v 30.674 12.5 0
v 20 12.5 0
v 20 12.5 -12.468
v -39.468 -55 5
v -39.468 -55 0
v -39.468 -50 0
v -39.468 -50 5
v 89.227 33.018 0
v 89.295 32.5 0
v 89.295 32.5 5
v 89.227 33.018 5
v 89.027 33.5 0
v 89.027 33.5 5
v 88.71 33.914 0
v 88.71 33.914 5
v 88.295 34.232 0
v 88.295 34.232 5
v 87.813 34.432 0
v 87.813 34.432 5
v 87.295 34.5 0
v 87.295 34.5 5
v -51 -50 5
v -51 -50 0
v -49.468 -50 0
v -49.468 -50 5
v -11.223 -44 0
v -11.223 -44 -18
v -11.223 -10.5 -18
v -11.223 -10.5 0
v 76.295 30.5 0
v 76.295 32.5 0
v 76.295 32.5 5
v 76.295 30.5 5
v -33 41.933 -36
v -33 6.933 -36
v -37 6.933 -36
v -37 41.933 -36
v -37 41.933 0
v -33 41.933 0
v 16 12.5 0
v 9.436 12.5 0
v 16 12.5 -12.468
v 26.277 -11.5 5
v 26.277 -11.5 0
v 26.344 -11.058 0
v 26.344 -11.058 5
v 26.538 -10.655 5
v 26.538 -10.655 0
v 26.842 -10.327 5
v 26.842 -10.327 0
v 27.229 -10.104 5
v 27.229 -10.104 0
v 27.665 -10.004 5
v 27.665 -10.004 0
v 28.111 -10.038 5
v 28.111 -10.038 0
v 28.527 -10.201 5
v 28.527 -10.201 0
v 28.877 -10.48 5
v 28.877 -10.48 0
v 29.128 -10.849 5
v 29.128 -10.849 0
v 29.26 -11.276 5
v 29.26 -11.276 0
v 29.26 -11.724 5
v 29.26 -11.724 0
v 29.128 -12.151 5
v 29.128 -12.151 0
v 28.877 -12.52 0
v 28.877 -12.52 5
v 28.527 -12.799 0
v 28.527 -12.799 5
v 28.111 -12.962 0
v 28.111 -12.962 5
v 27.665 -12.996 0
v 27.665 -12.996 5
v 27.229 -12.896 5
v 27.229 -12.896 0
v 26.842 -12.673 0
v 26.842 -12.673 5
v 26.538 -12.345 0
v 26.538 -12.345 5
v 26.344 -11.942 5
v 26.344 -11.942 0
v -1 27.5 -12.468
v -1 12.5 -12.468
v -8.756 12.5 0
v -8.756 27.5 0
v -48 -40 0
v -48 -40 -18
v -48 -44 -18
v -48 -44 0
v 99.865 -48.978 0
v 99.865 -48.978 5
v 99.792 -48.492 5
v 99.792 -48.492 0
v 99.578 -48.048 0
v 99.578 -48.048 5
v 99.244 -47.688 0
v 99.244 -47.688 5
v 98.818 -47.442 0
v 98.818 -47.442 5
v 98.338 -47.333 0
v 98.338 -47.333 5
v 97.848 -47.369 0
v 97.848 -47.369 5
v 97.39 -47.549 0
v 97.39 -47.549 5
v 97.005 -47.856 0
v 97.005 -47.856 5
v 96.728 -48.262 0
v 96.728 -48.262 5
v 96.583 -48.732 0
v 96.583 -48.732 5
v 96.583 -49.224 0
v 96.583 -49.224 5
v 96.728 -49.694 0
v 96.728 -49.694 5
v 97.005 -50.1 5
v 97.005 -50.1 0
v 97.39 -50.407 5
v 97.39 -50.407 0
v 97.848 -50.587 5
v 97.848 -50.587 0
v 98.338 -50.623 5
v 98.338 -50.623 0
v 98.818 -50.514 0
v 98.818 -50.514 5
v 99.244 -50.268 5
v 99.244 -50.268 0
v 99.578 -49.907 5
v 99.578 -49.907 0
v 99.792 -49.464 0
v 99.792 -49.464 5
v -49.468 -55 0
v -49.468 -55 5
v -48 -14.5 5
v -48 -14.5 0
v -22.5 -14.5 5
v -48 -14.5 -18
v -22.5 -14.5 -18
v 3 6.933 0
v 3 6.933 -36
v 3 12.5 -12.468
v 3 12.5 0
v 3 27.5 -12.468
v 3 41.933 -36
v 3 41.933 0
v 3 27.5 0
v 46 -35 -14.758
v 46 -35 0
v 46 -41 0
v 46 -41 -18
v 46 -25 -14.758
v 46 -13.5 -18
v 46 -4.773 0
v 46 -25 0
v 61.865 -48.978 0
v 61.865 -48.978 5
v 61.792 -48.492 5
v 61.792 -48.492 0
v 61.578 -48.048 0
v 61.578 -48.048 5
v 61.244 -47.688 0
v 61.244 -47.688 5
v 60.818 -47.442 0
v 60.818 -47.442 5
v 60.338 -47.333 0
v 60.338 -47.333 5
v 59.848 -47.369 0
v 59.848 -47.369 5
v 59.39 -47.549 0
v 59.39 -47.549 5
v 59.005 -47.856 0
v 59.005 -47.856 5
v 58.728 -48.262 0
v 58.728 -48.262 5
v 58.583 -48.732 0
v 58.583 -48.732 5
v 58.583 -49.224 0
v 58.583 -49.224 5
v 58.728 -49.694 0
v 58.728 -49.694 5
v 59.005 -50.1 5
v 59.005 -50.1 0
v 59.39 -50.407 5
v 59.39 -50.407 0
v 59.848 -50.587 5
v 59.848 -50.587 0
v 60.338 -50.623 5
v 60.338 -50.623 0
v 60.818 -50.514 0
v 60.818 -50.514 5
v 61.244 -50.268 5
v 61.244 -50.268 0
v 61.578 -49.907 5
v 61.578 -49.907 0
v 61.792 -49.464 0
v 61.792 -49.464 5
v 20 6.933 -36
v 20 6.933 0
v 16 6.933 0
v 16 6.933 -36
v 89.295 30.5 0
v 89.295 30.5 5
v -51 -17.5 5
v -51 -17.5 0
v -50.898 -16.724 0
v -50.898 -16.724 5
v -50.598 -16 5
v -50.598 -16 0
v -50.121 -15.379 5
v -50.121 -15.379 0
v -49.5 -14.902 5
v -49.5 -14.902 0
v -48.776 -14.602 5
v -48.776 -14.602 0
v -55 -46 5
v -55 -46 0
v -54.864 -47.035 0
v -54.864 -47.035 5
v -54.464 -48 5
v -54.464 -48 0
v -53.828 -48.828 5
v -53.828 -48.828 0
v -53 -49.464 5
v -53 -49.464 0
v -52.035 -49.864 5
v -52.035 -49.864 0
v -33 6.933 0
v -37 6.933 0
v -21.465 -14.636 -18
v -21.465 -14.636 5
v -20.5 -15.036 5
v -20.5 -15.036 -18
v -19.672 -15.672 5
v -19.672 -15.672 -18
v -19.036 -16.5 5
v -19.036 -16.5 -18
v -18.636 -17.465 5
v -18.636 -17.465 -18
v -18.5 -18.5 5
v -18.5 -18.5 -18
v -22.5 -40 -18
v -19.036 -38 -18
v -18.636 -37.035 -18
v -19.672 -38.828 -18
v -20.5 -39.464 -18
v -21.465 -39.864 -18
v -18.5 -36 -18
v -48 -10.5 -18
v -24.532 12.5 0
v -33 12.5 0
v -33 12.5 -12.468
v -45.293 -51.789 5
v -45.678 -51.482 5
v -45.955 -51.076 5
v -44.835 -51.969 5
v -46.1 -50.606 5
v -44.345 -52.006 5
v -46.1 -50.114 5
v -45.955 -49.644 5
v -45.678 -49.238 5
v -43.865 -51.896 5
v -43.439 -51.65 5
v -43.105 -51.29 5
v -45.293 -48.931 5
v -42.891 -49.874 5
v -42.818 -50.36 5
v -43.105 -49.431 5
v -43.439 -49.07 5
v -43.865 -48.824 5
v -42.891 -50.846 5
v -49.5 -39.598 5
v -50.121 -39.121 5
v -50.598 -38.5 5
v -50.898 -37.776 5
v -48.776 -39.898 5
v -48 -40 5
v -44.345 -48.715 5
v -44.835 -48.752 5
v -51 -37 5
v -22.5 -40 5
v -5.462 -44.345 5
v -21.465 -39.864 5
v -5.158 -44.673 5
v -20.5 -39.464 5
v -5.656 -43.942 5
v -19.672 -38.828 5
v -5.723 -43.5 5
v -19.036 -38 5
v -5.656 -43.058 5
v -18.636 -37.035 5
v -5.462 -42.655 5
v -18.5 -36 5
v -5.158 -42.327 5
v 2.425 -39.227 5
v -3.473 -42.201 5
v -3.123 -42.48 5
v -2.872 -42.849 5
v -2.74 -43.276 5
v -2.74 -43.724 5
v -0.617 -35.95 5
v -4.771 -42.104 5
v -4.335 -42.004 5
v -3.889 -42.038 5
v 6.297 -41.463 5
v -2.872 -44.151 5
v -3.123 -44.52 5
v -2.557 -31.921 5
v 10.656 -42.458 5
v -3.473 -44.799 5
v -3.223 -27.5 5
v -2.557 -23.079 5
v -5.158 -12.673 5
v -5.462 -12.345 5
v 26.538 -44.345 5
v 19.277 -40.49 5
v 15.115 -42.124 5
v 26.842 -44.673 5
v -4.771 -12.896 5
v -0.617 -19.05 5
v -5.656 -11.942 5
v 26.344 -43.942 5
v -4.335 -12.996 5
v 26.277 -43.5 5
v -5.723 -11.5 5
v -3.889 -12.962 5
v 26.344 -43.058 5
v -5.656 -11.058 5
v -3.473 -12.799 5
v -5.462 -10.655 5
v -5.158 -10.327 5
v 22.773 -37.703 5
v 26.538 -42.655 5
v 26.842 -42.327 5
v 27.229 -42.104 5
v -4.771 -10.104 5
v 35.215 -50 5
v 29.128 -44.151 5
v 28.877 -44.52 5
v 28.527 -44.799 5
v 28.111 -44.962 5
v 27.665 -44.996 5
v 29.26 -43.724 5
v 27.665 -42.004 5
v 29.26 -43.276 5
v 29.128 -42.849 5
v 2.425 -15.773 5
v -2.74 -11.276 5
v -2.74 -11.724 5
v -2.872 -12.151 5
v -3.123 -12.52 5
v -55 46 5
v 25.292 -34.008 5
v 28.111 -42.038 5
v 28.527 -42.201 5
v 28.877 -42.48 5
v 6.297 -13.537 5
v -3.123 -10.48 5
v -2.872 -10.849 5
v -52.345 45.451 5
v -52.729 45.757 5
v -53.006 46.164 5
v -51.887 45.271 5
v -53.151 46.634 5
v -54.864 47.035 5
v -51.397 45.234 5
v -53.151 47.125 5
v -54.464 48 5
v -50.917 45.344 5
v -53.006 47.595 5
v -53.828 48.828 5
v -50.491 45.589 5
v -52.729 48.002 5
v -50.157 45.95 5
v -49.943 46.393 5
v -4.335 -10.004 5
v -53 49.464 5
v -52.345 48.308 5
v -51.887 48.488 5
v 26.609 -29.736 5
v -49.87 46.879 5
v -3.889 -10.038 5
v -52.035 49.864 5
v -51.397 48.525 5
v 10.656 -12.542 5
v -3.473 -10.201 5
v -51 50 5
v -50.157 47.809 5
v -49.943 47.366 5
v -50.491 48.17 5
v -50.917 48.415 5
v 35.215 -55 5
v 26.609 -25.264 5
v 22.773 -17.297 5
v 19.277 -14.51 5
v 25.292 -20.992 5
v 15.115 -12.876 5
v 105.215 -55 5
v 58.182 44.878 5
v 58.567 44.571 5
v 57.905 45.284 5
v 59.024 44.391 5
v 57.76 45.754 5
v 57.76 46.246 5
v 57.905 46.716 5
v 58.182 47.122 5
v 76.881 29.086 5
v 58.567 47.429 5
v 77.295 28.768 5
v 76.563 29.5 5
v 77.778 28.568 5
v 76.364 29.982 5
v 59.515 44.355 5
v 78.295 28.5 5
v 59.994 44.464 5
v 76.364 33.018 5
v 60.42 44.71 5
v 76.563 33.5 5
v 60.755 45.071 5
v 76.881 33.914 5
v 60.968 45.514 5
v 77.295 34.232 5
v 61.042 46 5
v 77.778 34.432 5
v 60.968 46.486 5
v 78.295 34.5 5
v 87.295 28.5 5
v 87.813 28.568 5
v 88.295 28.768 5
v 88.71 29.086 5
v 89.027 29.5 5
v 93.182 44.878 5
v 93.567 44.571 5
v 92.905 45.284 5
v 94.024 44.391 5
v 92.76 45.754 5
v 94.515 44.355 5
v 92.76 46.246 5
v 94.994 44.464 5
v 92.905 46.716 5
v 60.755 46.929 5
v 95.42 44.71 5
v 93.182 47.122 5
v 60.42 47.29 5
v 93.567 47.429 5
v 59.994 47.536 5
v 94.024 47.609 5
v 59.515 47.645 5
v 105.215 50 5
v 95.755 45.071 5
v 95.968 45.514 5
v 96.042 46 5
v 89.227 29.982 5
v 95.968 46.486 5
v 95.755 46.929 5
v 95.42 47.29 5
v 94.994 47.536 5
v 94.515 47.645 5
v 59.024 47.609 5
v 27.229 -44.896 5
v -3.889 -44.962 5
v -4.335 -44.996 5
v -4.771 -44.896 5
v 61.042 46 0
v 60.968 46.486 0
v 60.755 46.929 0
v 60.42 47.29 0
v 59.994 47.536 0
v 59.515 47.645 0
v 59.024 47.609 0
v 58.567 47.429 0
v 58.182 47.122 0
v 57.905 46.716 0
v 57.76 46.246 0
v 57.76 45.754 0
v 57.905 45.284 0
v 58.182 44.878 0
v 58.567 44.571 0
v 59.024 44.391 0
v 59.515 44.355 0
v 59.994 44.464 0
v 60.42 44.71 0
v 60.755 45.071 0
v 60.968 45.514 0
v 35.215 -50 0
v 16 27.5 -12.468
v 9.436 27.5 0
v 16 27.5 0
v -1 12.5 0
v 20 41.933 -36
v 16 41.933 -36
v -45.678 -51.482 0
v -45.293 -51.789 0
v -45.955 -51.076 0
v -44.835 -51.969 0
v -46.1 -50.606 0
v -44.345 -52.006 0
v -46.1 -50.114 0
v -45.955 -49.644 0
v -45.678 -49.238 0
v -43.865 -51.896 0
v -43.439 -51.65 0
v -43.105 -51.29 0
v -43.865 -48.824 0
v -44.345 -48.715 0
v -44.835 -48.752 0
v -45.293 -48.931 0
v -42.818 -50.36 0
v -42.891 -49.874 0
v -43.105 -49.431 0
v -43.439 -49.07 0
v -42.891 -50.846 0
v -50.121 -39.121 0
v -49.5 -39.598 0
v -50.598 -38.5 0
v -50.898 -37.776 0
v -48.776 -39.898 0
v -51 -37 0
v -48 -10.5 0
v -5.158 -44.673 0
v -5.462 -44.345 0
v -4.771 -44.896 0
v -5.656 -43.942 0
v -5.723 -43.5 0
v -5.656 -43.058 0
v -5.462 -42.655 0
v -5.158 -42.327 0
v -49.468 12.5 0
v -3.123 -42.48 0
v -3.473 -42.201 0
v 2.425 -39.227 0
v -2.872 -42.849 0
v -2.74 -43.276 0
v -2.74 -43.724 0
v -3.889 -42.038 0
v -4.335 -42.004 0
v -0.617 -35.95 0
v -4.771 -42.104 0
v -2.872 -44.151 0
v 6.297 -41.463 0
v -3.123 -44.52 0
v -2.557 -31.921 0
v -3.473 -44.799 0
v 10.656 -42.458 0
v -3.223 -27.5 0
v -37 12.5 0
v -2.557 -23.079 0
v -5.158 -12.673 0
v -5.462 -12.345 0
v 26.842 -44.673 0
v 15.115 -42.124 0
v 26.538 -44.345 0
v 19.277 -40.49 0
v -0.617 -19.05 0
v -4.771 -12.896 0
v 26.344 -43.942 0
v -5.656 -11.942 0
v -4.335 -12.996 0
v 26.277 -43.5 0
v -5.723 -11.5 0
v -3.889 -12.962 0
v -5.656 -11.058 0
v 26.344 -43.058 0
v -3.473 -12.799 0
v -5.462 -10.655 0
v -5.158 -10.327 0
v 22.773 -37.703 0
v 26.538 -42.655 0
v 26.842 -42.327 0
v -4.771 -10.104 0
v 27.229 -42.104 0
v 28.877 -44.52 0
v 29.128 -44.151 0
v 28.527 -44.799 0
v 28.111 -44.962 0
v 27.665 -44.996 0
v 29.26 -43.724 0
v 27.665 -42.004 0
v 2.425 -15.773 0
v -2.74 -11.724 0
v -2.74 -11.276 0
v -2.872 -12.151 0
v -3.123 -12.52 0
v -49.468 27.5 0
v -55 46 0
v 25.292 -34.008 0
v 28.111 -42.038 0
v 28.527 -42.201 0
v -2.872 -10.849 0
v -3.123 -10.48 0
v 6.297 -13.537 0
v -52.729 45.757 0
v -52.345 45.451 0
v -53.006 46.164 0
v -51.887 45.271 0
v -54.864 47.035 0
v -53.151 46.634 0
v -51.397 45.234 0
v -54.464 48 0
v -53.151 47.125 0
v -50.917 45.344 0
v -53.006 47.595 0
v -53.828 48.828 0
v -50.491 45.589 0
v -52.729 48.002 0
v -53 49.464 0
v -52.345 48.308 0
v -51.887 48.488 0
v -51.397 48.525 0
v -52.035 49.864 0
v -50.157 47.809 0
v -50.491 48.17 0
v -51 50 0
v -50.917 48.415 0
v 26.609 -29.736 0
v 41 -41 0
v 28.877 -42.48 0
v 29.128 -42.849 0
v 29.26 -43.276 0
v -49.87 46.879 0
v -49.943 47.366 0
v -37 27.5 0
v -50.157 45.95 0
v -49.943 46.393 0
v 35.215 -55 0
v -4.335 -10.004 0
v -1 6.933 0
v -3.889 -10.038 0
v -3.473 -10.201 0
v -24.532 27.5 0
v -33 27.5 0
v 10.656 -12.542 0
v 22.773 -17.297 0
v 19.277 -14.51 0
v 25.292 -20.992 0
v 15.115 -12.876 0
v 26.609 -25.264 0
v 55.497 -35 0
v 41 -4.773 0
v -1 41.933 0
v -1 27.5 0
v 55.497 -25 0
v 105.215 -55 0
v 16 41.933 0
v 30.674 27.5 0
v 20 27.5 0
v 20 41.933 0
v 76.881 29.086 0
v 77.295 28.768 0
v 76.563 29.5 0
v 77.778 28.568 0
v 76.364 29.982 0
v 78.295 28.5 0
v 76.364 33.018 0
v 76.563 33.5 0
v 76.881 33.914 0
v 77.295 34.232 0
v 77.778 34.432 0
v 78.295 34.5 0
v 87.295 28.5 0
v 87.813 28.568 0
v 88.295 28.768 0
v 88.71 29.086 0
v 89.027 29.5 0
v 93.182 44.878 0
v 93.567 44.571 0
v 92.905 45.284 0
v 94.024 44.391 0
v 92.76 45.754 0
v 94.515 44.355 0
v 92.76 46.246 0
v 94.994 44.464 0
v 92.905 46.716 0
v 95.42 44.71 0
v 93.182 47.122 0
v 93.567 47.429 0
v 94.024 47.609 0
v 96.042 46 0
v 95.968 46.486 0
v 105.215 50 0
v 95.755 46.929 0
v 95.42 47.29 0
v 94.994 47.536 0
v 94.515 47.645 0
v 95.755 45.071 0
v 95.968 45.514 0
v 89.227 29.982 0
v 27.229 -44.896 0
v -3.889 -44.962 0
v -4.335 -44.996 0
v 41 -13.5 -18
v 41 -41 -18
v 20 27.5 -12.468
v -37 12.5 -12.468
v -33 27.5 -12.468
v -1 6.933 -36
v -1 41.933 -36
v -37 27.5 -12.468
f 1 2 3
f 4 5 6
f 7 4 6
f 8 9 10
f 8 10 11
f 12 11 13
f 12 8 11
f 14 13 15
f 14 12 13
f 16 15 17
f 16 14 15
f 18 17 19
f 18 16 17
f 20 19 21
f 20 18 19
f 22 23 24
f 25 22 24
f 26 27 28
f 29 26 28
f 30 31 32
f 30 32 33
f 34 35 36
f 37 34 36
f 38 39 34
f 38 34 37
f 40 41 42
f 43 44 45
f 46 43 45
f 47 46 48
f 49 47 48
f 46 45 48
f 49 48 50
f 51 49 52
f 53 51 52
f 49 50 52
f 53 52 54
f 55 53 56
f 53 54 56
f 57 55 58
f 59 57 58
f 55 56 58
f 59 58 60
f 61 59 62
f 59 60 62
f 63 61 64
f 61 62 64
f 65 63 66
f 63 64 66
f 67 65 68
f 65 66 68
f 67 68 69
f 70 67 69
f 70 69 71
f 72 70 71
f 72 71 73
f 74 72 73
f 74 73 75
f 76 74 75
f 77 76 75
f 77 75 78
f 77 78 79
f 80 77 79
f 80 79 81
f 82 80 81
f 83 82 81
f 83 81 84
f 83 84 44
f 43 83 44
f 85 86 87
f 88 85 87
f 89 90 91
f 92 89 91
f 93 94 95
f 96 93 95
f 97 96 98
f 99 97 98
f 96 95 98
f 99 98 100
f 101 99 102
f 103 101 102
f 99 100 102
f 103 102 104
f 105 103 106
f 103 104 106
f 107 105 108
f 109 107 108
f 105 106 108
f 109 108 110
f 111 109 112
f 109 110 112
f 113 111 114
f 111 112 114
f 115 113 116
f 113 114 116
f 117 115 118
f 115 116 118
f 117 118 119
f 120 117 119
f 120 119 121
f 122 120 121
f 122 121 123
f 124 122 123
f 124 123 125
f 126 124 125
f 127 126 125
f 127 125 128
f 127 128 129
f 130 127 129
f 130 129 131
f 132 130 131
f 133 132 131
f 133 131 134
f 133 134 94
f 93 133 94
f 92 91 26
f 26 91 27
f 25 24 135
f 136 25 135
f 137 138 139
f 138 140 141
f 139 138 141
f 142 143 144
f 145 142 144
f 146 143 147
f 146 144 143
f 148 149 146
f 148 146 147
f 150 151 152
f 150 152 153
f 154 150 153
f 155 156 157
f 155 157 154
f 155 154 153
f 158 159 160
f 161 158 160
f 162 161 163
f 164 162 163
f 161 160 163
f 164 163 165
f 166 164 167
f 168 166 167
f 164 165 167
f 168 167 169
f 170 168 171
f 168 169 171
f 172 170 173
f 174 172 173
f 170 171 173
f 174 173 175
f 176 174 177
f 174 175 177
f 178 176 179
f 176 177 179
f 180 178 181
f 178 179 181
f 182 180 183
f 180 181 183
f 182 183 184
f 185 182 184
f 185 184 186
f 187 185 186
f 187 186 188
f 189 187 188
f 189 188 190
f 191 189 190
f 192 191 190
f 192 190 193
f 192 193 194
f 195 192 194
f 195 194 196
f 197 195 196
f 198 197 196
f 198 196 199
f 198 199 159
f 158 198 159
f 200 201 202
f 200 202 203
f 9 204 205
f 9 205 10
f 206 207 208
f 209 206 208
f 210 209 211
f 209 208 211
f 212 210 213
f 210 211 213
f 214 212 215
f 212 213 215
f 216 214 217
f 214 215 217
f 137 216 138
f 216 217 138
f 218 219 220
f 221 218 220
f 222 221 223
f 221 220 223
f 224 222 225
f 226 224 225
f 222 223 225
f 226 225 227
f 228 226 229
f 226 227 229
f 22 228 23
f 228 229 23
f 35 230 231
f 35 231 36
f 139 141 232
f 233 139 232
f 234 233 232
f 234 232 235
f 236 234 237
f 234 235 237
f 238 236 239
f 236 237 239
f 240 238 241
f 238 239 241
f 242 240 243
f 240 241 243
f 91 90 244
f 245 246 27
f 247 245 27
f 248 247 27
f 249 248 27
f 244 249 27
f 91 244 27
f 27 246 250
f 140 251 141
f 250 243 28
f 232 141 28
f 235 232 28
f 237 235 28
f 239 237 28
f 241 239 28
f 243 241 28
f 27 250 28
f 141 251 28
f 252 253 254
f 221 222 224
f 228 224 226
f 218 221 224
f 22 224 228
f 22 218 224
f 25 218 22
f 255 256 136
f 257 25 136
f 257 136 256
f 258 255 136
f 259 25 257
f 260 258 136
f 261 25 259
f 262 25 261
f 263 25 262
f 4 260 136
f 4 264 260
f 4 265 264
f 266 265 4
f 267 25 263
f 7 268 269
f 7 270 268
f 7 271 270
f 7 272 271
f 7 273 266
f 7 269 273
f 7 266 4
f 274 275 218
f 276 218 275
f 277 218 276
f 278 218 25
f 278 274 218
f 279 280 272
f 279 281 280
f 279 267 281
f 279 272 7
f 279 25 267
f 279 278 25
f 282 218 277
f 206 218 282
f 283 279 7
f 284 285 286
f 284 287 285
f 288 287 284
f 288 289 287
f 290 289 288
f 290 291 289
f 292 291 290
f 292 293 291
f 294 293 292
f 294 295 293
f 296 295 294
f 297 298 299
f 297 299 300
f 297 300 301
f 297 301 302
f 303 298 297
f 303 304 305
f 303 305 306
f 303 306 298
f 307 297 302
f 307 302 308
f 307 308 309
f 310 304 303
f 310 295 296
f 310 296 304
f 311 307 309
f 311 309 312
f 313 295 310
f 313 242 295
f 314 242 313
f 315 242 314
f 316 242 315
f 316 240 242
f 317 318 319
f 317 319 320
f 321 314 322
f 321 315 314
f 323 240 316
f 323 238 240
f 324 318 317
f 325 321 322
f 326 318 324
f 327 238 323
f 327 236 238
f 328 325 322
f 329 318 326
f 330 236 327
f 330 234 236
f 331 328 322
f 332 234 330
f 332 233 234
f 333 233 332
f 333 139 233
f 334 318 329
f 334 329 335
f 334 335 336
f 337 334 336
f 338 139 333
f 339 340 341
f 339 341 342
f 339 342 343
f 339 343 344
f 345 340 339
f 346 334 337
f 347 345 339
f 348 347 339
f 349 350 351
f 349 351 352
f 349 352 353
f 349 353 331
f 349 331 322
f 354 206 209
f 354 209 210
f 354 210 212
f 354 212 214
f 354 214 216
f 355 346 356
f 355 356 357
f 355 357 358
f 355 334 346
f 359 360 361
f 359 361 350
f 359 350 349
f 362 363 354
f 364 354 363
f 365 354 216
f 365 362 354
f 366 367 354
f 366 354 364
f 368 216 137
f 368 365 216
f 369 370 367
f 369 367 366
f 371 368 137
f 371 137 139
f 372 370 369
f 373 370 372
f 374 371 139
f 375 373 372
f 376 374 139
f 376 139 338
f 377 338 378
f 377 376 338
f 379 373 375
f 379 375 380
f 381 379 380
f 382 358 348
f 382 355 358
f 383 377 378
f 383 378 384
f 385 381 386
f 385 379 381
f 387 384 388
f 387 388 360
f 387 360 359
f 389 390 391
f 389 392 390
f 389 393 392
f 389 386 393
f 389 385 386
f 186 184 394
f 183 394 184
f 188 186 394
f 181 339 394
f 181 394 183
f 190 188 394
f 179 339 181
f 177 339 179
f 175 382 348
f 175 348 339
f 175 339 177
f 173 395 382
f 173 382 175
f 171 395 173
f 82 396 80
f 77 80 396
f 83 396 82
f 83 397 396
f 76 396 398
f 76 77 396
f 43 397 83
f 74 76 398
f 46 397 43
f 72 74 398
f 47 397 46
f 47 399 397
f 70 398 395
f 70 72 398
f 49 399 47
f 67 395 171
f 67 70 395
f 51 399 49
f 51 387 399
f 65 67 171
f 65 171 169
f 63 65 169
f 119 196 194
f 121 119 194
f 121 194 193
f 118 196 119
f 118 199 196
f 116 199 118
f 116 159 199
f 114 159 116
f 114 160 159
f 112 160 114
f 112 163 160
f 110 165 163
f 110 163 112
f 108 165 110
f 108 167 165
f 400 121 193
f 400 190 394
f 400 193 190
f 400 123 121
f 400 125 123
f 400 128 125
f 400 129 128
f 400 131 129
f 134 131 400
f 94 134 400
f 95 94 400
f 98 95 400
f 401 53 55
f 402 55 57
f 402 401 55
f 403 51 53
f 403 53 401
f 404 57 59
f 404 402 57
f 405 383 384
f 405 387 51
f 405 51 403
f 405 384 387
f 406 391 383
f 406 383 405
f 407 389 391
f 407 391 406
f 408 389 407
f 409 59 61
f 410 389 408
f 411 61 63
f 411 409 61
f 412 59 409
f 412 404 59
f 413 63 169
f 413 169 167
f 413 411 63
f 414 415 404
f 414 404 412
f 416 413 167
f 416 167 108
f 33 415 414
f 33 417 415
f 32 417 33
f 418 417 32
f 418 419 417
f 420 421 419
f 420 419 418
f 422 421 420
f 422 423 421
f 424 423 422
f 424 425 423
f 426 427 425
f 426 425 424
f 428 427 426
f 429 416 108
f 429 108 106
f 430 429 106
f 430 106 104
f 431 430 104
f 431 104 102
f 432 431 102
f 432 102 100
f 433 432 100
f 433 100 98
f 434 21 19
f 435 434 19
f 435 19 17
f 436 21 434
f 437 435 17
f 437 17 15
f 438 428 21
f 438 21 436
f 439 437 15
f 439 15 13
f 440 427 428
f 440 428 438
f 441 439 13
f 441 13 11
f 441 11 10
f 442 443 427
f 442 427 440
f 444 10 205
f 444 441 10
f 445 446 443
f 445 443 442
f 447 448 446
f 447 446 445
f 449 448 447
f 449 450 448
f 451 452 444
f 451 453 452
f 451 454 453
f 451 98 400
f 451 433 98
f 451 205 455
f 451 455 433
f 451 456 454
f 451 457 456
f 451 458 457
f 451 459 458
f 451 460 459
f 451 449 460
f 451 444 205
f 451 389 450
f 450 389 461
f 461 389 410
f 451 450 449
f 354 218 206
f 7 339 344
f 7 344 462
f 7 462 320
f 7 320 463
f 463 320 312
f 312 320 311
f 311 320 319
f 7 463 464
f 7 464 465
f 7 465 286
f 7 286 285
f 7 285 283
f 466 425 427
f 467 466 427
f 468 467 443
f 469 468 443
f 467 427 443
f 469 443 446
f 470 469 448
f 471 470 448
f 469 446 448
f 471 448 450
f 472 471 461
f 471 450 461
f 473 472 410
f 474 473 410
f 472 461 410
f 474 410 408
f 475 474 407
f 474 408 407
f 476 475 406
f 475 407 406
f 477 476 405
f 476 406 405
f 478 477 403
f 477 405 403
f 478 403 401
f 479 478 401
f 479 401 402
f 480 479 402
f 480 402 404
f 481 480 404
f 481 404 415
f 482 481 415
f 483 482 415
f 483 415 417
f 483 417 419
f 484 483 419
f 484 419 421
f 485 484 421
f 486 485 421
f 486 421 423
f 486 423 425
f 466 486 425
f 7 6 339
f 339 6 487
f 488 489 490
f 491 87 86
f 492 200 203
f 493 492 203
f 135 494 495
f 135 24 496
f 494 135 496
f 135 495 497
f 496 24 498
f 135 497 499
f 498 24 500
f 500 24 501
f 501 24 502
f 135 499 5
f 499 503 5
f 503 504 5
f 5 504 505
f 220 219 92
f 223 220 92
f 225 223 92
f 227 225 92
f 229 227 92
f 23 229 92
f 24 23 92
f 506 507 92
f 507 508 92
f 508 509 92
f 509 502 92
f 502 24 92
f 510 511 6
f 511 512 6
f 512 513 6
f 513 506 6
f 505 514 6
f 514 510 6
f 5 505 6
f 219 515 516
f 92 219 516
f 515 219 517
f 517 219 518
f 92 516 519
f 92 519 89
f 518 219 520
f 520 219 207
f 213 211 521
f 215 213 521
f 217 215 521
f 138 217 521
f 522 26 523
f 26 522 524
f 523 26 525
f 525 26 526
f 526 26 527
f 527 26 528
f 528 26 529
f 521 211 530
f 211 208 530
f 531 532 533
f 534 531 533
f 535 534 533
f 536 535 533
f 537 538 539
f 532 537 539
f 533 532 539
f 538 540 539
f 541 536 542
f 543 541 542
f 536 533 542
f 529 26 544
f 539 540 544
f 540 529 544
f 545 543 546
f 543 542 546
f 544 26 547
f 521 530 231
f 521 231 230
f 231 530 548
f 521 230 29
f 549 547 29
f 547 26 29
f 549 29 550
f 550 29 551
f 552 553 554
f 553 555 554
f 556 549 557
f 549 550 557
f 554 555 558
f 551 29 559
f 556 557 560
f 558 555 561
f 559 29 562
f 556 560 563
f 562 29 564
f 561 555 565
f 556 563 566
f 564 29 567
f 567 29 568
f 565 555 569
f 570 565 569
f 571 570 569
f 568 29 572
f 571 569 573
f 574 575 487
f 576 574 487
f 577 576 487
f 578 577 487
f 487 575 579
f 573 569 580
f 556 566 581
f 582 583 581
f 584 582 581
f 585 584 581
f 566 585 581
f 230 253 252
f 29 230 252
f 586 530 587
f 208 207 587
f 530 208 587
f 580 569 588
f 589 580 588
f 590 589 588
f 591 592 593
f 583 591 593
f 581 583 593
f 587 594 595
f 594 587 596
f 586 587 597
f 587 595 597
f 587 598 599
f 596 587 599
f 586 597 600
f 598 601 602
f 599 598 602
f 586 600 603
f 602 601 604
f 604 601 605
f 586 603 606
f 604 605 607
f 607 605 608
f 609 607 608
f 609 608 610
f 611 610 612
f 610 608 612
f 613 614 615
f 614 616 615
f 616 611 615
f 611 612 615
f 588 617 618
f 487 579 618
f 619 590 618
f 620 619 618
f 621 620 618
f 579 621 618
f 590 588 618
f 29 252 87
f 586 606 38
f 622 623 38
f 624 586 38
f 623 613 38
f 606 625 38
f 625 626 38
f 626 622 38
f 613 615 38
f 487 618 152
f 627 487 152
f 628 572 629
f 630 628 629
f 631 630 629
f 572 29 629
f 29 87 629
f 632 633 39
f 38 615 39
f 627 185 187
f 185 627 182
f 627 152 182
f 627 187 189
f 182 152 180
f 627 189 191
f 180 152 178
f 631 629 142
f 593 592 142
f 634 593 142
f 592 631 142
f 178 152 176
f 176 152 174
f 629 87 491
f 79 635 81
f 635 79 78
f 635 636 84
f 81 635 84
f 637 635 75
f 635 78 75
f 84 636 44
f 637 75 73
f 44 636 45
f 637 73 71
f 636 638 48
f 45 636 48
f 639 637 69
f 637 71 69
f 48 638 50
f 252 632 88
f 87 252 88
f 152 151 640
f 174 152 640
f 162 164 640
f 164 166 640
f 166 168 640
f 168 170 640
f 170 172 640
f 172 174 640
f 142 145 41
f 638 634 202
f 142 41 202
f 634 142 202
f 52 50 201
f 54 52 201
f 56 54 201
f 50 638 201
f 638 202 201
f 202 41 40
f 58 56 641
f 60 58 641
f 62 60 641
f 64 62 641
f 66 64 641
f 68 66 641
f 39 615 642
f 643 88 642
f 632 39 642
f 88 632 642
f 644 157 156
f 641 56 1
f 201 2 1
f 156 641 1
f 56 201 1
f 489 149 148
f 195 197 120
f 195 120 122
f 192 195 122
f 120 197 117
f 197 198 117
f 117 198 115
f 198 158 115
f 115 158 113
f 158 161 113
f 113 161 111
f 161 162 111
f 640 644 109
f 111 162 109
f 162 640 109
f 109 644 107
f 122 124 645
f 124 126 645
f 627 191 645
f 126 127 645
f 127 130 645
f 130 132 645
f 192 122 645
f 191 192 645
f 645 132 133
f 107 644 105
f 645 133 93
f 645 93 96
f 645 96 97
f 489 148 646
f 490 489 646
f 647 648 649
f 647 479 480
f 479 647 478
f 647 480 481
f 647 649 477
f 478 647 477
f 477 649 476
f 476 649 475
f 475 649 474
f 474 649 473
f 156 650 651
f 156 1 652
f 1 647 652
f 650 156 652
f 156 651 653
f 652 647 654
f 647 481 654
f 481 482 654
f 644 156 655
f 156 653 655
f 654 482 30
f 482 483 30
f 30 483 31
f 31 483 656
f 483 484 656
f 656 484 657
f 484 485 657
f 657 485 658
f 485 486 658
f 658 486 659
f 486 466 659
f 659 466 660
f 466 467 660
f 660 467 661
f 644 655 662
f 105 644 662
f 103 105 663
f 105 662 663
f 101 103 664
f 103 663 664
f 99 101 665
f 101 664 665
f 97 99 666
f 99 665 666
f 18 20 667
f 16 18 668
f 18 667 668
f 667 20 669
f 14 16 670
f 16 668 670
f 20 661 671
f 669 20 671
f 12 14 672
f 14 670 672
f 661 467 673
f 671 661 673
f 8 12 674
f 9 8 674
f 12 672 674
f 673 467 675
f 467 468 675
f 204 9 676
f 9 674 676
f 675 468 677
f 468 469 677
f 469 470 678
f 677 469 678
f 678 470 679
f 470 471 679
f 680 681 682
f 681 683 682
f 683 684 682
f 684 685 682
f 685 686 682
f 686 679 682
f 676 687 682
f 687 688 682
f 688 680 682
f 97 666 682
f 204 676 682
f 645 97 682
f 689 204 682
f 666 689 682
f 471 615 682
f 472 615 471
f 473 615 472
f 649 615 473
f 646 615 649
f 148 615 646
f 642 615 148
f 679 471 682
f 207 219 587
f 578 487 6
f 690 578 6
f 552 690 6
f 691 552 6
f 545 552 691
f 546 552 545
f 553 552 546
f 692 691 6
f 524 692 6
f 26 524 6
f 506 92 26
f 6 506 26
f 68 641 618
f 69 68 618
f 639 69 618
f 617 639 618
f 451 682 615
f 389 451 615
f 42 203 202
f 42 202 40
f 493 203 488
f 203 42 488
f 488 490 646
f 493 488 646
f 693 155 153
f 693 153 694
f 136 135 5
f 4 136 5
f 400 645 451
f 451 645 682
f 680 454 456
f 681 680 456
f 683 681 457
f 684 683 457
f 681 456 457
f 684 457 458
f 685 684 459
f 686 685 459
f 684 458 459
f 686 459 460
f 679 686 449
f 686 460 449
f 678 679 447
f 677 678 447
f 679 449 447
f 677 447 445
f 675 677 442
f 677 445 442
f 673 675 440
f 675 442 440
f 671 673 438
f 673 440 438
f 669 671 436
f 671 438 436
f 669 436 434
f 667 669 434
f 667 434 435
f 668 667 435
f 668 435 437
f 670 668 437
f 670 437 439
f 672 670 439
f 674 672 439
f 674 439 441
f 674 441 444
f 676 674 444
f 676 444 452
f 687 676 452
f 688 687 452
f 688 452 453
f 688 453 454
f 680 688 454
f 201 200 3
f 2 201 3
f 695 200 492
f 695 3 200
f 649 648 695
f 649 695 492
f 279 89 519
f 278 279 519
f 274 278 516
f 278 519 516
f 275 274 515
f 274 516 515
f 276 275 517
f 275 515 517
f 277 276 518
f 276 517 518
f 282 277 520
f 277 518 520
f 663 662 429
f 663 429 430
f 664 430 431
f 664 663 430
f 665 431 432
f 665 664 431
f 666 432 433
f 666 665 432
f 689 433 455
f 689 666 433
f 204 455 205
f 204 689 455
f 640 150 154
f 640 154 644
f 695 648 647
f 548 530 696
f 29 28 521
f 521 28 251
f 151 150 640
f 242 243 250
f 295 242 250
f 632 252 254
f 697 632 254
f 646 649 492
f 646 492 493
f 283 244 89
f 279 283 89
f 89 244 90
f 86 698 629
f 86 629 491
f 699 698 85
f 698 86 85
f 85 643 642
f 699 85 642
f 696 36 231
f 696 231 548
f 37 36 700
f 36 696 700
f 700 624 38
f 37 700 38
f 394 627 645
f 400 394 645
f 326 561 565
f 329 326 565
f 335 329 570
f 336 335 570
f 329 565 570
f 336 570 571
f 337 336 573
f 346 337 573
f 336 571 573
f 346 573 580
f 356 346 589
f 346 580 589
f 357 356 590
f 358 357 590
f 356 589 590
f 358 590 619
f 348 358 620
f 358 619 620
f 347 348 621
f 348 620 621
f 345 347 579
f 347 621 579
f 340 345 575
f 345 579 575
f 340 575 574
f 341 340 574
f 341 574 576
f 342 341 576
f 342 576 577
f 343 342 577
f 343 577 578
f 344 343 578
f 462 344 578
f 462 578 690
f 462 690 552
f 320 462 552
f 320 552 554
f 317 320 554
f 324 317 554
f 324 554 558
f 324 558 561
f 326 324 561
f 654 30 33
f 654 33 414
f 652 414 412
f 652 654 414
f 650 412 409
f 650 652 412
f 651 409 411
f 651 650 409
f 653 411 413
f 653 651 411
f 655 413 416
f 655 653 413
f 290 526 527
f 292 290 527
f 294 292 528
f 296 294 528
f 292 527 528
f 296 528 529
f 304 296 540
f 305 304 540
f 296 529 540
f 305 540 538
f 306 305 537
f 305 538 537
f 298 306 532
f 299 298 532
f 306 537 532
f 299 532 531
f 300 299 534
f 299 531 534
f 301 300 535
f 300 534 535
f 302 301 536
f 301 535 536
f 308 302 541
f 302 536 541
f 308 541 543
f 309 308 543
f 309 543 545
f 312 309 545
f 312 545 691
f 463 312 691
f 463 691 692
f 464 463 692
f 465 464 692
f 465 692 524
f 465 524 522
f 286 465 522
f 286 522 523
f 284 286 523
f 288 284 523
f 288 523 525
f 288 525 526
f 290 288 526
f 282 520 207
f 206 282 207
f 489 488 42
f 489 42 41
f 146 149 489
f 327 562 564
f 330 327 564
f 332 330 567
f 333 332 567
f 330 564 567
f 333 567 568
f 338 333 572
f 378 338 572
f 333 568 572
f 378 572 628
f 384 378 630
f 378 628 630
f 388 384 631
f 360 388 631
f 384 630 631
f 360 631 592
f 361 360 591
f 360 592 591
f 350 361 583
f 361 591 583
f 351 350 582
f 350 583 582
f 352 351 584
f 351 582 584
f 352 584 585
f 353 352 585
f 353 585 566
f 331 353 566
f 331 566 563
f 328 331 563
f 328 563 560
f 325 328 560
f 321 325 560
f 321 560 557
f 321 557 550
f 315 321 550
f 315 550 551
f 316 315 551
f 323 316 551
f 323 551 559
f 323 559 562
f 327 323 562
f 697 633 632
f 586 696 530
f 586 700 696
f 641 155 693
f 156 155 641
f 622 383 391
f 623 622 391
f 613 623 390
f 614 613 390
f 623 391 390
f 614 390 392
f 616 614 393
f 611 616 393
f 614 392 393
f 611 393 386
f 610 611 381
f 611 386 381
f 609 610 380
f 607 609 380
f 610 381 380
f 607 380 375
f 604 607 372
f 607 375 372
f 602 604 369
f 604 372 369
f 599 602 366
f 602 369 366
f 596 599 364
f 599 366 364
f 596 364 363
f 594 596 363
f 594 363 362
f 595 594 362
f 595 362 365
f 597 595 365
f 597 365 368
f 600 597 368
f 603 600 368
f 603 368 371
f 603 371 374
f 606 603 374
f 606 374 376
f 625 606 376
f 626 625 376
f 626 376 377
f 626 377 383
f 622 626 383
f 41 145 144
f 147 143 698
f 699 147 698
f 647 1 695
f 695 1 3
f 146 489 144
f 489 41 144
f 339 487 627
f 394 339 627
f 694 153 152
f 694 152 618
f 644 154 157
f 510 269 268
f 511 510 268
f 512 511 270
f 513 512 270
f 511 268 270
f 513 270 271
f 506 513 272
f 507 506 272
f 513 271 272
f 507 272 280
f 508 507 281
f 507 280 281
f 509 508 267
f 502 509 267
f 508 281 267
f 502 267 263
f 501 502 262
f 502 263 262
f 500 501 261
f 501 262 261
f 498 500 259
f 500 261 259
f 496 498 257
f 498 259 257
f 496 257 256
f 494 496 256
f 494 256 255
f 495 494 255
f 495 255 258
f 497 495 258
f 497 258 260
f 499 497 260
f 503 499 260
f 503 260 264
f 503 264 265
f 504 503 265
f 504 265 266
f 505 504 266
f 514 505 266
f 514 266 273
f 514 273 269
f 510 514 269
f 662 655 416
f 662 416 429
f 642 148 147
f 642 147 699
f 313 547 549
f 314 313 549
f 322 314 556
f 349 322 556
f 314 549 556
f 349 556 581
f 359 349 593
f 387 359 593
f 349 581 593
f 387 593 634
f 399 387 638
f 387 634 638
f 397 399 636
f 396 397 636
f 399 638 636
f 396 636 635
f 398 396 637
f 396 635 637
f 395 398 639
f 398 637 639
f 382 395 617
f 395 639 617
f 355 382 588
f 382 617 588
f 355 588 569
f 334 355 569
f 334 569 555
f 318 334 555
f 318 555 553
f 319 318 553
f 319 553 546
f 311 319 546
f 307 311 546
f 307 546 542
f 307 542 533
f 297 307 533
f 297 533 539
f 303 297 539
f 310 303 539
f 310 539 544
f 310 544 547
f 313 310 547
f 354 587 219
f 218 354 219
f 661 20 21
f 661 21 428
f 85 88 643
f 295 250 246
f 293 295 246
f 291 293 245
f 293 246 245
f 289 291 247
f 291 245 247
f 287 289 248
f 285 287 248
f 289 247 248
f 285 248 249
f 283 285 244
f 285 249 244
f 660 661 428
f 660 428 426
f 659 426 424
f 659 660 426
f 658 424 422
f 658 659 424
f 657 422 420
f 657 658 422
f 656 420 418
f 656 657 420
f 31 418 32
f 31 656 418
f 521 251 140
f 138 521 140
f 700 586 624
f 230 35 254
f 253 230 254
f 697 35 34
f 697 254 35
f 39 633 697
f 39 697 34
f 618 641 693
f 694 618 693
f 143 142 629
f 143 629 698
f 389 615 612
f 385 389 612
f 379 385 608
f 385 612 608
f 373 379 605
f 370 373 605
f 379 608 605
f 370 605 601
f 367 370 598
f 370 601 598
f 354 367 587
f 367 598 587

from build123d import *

# Parameters (mm, degrees)
EXTRUDE_1_DEPTH          = 5
SKETCH_2_W               = 4
SKETCH_2_H               = 40
EXTRUDE_2_DEPTH          = 36
EXTRUDE_3_DEPTH          = 7.5
CUT_EXTRUDE_2_DEPTH      = 14
EXTRUDE_START            = 18
SKETCH_5_W               = 5
SKETCH_5_H               = 27.5
EXTRUDE_4_DEPTH          = 18
SKETCH_6_R               = 15
SKETCH_6_R_2             = 1.5
CUT_EXTRUDE_3_DEPTH      = 18
CUT_EXTRUDE_4_DEPTH      = 15
CUT_EXTRUDE_4_DEPTH_BACK = 26
SKETCH_9_R               = 1.65
CUT_EXTRUDE_5_DEPTH      = 41
RIB_2_REACH              = 138.99
SKETCH_10_WALL_W         = 293.529278964
SKETCH_10_WALL_H         = 10
EXTRUDE_6_DEPTH          = 5
SKETCH_12_W              = 36
SKETCH_12_H              = 5
CUT_EXTRUDE_6_DEPTH      = 87


with BuildPart() as part:
    # 草图1 → 凸台-拉伸1 (new body)
    with BuildSketch(Plane.XY):
        with BuildLine():
            Line((105.214975384, -55), (105.214975384, 50))
            Line((105.214975384, 50), (-51, 50))
            ThreePointArc((-51, 50), (-53.828427125, 48.828427125), (-55, 46))
            Line((-55, 46), (-55, -46))
            ThreePointArc((-55, -46), (-53.828427125, -48.828427125), (-51, -50))
            Line((-51, -50), (-49.468062182, -50))
            Line((-49.468062182, -50), (-49.468062182, -55))
            Line((-49.468062182, -55), (-39.468062182, -55))
            Line((-39.468062182, -55), (-39.468062182, -50))
            Line((-39.468062182, -50), (35.214975384, -50))
            Line((35.214975384, -50), (35.214975384, -55))
            Line((35.214975384, -55), (105.214975384, -55))
        make_face()
    extrude(amount=EXTRUDE_1_DEPTH)

    # 草图2 → 凸台-拉伸2 (add)
    with BuildSketch(Plane(origin=(0, 0, 0), x_dir=(-1, 0, 0), z_dir=(0, 0, -1))):
        with Locations((35, 21.933022766)):
            Rectangle(SKETCH_2_W, SKETCH_2_H)
        with Locations((-1, 21.933022766)):
            Rectangle(SKETCH_2_W, SKETCH_2_H)
        with Locations((-18, 21.933022766)):
            Rectangle(SKETCH_2_W, SKETCH_2_H)
    extrude(amount=EXTRUDE_2_DEPTH)

    # 草图3 → 凸台-拉伸3 (add, symmetric)
    with BuildSketch(Plane(origin=(0, 20, 0), x_dir=(1, 0, 0), z_dir=(0, 1, 0))):
        Polygon((20, 12.468062182), (20, 0), (30.673808223, 0), align=None)
        Polygon((16, 12.468062182), (9.436406156, 0), (16, 0), align=None)
        Polygon((3, 12.468062182), (3, 0), (9.436406156, 0), align=None)
        Polygon((-1, 12.468062182), (-8.755927232, 0), (-1, 0), align=None)
        Polygon((-33, 12.468062182), (-33, 0), (-24.531937818, 0), align=None)
        Polygon((-37, 12.468062182), (-49.468062182, 0), (-37, 0), align=None)
    extrude(amount=EXTRUDE_3_DEPTH, both=True)

    # 草图4 → 切除-拉伸2 (cut)
    with BuildSketch(Plane(origin=(0, 0, 0), x_dir=(-1, 0, 0), z_dir=(0, 0, -1))):
        with BuildLine():
            Line((18.5, -18.5), (18.5, -36))
            ThreePointArc((18.5, -36), (19.671572875, -38.828427125), (22.5, -40))
            Line((22.5, -40), (48, -40))
            ThreePointArc((48, -40), (50.121320344, -39.121320344), (51, -37))
            Line((51, -37), (51, -17.5))
            ThreePointArc((51, -17.5), (50.121320344, -15.378679656), (48, -14.5))
            Line((48, -14.5), (22.5, -14.5))
            ThreePointArc((22.5, -14.5), (19.671572875, -15.671572875), (18.5, -18.5))
        make_face()
    extrude(amount=-CUT_EXTRUDE_2_DEPTH, mode=Mode.SUBTRACT)

    # 草图5 → 凸台-拉伸4 (add)
    with BuildSketch(Plane(origin=(0, 0, 0), x_dir=(-1, 0, 0), z_dir=(0, 0, -1)).offset(EXTRUDE_START)):
        with Locations((-43.5, -27.25)):
            Rectangle(SKETCH_5_W, SKETCH_5_H)
        with BuildLine():
            Line((18.5, -18.5), (18.5, -36))
            ThreePointArc((18.5, -36), (19.671572875, -38.828427125), (22.5, -40))
            Line((22.5, -40), (48, -40))
            Line((48, -40), (48, -44))
            Line((48, -44), (11.223006292, -44))
            Line((11.223006292, -44), (11.223006292, -41))
            Line((11.223006292, -41), (11.223006292, -13.5))
            Line((11.223006292, -13.5), (11.223006292, -10.5))
            Line((11.223006292, -10.5), (48, -10.5))
            Line((48, -10.5), (48, -14.5))
            Line((48, -14.5), (22.5, -14.5))
            ThreePointArc((22.5, -14.5), (19.671572875, -15.671572875), (18.5, -18.5))
        make_face()
    extrude(amount=-EXTRUDE_4_DEPTH)

    # 草图6 → 切除-拉伸3 (cut)
    with BuildSketch(Plane(origin=(0, 0, 0), x_dir=(-1, 0, 0), z_dir=(0, 0, -1))):
        with Locations((-11.776993708, -27.5)):
            Circle(SKETCH_6_R)
        with Locations((4.223006292, -43.5)):
            Circle(SKETCH_6_R_2)
        with Locations((4.223006292, -11.5)):
            Circle(SKETCH_6_R_2)
        with Locations((-27.776993708, -11.5)):
            Circle(SKETCH_6_R_2)
        with Locations((-27.776993708, -43.5)):
            Circle(SKETCH_6_R_2)
    extrude(amount=-CUT_EXTRUDE_3_DEPTH, mode=Mode.SUBTRACT)

    # 草图7 → 切除-拉伸4 (cut, two sides: drawn at the far end of the back side and taken through both)
    with BuildSketch(Plane.XY.offset(5).offset(-CUT_EXTRUDE_4_DEPTH_BACK)):
        with BuildLine():
            Line((78.295417345, 28.5), (87.295417345, 28.5))
            ThreePointArc((87.295417345, 28.5), (88.709630907, 29.085786438), (89.295417345, 30.5))
            Line((89.295417345, 30.5), (89.295417345, 32.5))
            ThreePointArc((89.295417345, 32.5), (88.709630907, 33.914213562), (87.295417345, 34.5))
            Line((87.295417345, 34.5), (78.295417345, 34.5))
            ThreePointArc((78.295417345, 34.5), (76.881203783, 33.914213562), (76.295417345, 32.5))
            Line((76.295417345, 32.5), (76.295417345, 30.5))
            ThreePointArc((76.295417345, 30.5), (76.881203783, 29.085786438), (78.295417345, 28.5))
        make_face()
    extrude(amount=CUT_EXTRUDE_4_DEPTH + CUT_EXTRUDE_4_DEPTH_BACK, mode=Mode.SUBTRACT)

    # 草图9 → 切除-拉伸5 (cut)
    with BuildSketch(Plane.XY.offset(5)):
        with Locations((-44.468062182, -50.360148647)):
            Circle(SKETCH_9_R)
        with Locations((-51.519821375, 46.879485601)):
            Circle(SKETCH_9_R)
        with Locations((60.214975384, -48.977955399)):
            Circle(SKETCH_9_R)
        with Locations((59.391625653, 46)):
            Circle(SKETCH_9_R)
        with Locations((98.214975384, -48.977955399)):
            Circle(SKETCH_9_R)
        with Locations((94.391625653, 46)):
            Circle(SKETCH_9_R)
    extrude(amount=-CUT_EXTRUDE_5_DEPTH, mode=Mode.SUBTRACT)

    # 草图10 wall → 筋2 (add, up to next)
    with BuildSketch(Plane(origin=(50.748705284, -30, -7.378924001), x_dir=(0.541169685132, 0, 0.840913415218), z_dir=(0.840913415218, 0, -0.541169685132)), mode=Mode.PRIVATE) as rib_2_sk1:
        Rectangle(SKETCH_10_WALL_W, SKETCH_10_WALL_H)
    rib_2_tool1 = extrude(rib_2_sk1.sketch, amount=-RIB_2_REACH, mode=Mode.PRIVATE) - part.part
    add(rib_2_tool1.solids().sort_by_distance((50.748705284, -30, -7.378924001))[0])

    # 草图11 → 凸台-拉伸6 (add)
    with BuildSketch(Plane(origin=(46, 0, 0), x_dir=(0, 0, -1), z_dir=(1, 0, 0))):
        Polygon((18, -13.5), (0, -4.773458624), (0, -13.5), align=None)
    extrude(amount=-EXTRUDE_6_DEPTH)

    # 草图12 → 切除-拉伸6 (cut)
    with BuildSketch(Plane(origin=(20, 0, 0), x_dir=(0, 0, -1), z_dir=(1, 0, 0))):
        with Locations((18, 4.433022766)):
            Rectangle(SKETCH_12_W, SKETCH_12_H)
    extrude(amount=-CUT_EXTRUDE_6_DEPTH, mode=Mode.SUBTRACT)


solid = part.part
